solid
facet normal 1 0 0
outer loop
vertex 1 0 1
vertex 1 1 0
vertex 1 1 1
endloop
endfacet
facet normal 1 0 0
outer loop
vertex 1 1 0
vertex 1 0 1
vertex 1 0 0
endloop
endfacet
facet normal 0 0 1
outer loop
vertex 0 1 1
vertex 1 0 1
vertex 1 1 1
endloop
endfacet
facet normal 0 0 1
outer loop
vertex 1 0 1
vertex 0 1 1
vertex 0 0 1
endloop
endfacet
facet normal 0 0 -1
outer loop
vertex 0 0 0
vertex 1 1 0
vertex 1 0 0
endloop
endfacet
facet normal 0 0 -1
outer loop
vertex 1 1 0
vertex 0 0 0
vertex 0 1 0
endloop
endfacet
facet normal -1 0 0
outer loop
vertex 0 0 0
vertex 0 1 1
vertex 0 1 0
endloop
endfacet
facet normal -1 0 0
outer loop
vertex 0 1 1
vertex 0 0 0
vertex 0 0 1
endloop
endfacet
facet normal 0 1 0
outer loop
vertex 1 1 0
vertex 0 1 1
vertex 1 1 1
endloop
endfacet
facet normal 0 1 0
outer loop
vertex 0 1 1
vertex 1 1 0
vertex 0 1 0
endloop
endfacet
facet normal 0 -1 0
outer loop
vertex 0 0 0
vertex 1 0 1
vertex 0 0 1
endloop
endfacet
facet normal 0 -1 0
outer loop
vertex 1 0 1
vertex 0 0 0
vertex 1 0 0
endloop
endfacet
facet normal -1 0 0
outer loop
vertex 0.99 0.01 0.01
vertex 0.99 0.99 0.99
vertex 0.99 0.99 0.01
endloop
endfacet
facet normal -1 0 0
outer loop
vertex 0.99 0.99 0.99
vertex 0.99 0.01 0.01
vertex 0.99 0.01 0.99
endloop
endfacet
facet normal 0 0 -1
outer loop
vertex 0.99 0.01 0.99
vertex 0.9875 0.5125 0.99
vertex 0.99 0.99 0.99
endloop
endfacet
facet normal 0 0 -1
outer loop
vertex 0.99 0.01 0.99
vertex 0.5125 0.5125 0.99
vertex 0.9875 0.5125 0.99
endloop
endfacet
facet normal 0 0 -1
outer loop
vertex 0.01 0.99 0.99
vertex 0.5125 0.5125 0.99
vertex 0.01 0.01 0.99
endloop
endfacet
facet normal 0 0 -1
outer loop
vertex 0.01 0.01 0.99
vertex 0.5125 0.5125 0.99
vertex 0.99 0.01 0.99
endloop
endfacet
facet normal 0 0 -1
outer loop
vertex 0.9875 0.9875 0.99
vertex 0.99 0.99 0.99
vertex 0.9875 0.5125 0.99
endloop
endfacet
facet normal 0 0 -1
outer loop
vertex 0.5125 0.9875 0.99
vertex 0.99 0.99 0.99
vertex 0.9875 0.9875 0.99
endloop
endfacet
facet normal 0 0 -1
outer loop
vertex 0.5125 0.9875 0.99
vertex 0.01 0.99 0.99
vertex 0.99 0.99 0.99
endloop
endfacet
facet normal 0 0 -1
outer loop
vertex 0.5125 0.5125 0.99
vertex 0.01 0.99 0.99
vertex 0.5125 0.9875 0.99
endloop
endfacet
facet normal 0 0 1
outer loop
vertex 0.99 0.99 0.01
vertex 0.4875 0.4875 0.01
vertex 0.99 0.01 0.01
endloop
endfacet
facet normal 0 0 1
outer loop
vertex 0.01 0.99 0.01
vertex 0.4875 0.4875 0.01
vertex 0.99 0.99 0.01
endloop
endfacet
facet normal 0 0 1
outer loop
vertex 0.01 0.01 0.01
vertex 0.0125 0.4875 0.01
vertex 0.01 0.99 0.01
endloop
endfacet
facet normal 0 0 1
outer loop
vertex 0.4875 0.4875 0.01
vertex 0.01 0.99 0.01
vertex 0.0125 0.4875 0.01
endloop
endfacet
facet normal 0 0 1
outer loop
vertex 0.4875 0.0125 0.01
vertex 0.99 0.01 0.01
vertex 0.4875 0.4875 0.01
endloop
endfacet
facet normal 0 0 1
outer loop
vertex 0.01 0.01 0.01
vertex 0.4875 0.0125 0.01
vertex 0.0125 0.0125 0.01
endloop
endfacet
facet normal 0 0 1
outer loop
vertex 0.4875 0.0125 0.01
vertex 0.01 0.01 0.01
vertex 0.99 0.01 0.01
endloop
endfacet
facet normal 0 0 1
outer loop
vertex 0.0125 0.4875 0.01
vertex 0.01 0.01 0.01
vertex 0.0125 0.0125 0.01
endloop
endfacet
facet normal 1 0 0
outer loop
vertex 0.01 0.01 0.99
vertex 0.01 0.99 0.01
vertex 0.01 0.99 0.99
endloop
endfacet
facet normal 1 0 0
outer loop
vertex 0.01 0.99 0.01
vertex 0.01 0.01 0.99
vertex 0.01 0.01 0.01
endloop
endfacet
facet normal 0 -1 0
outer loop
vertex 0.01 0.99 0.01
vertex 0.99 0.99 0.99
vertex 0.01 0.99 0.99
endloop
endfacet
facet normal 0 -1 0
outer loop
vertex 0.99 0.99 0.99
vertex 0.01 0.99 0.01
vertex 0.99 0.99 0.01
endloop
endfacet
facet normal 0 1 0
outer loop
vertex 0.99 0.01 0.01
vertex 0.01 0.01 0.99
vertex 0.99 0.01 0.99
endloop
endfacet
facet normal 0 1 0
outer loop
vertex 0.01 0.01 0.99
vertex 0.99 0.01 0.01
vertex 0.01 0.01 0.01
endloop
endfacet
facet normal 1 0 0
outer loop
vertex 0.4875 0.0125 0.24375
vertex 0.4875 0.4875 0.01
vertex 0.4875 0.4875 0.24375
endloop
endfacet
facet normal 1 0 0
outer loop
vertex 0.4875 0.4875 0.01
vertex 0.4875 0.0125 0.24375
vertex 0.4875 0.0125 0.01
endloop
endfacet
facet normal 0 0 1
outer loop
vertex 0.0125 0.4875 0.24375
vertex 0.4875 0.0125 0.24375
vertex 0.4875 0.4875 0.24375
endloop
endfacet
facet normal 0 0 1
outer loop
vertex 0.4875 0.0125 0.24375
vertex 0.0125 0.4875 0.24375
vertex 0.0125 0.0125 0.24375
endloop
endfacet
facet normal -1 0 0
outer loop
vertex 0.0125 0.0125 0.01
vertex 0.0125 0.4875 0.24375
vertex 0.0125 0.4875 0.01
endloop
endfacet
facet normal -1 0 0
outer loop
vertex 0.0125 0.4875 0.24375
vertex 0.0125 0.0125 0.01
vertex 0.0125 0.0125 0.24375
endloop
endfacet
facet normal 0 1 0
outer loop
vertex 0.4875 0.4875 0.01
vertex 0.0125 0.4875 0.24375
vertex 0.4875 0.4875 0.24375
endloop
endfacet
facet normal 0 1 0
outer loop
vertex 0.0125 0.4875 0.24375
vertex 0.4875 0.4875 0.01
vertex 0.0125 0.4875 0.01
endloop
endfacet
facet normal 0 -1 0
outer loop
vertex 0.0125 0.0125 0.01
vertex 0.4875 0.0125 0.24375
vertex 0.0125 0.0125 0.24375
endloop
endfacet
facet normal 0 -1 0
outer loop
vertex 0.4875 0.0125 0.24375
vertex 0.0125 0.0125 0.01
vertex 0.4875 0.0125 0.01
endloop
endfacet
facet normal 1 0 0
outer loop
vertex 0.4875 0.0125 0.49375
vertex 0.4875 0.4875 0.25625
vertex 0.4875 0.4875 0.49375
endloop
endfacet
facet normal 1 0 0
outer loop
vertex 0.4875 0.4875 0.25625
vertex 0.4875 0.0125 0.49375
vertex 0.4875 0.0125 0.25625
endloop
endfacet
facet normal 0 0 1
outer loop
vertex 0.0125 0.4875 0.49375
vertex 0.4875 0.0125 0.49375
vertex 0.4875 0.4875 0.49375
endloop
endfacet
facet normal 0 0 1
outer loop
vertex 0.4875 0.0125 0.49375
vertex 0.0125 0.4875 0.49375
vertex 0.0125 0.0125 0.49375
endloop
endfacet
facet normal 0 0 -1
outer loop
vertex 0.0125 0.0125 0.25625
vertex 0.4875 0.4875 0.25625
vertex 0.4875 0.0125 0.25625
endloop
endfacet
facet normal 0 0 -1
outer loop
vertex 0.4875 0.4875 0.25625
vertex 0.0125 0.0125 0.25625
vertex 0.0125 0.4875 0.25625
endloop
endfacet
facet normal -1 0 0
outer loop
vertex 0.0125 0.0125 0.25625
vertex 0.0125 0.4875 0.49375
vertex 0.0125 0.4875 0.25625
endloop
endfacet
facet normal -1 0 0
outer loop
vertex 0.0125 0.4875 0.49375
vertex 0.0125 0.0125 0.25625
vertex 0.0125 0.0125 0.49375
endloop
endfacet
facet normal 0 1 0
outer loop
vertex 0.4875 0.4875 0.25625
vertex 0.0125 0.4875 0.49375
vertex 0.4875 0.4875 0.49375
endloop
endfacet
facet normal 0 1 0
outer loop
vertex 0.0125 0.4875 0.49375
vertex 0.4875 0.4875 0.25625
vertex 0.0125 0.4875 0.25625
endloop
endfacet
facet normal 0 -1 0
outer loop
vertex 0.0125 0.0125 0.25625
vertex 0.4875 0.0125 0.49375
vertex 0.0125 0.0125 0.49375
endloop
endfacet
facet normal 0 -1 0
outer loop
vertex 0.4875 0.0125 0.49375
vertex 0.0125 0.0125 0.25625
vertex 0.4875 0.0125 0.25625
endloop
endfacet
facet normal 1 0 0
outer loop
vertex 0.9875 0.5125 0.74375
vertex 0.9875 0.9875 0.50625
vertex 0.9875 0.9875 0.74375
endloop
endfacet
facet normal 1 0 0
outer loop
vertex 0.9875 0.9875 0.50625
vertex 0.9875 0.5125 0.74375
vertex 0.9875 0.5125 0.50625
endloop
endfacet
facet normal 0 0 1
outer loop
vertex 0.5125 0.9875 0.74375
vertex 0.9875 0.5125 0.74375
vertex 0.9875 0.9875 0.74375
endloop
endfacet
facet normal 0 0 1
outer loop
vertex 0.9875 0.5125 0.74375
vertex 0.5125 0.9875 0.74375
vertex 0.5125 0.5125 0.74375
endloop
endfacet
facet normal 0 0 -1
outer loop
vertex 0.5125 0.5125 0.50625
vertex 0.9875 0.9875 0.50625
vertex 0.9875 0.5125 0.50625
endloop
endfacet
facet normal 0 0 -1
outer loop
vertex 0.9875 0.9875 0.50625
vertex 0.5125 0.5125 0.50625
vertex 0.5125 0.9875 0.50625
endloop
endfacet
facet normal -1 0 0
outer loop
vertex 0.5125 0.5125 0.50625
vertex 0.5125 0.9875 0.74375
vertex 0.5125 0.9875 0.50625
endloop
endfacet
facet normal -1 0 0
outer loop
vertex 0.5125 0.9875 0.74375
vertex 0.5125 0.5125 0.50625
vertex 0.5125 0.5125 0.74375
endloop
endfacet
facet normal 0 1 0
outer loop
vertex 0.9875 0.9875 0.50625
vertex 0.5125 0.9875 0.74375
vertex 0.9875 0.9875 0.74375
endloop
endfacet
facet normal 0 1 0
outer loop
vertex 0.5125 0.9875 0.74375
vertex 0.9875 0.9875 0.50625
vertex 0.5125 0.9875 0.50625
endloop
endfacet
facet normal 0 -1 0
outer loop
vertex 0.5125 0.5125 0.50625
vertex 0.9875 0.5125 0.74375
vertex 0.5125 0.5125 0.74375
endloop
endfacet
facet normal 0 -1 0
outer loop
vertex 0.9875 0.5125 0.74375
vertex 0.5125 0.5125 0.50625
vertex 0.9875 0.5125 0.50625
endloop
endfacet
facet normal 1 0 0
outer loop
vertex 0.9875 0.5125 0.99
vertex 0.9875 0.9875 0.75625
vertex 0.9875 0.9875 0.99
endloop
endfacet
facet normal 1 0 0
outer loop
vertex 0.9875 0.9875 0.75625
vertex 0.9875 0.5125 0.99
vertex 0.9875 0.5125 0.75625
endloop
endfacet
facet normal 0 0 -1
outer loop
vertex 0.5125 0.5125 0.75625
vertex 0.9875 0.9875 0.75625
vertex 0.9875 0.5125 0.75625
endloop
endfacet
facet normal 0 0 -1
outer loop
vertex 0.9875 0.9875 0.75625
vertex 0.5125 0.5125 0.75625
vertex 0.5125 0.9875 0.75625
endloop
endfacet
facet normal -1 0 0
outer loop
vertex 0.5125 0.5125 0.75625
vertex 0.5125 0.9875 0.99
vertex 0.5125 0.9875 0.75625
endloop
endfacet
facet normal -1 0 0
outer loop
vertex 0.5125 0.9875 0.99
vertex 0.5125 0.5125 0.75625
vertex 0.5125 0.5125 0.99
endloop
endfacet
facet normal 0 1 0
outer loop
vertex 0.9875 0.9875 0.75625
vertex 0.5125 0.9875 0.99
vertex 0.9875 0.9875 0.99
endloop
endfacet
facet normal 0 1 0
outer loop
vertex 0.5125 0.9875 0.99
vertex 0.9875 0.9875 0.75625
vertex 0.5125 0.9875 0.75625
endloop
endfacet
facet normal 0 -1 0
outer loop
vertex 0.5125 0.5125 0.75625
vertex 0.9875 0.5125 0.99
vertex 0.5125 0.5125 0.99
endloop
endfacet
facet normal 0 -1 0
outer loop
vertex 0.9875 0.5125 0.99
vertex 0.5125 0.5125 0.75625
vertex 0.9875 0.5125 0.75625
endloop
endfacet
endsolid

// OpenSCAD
translate([0.25, 0.25, 0.125]) color([0.471983165944875, 0.9714323160653209, 0.04763662747320219]) cube([0.475, 0.475, 0.2375], center=true);
translate([0.25, 0.25, 0.375]) color([0.6017048999912084, 0.4238608699583831, 0.4638000243525888]) cube([0.475, 0.475, 0.2375], center=true);
translate([0.75, 0.75, 0.625]) color([0.7209222138626044, 0.34055156238440487, 0.1919764175902523]) cube([0.475, 0.475, 0.2375], center=true);
translate([0.75, 0.75, 0.875]) color([0.14158894806865308, 0.5899031024545329, 0.5257452959268315]) cube([0.475, 0.475, 0.2375], center=true);
color([0.3,0.3,0.3,0.3]) difference() { cube([1,1,1]); translate([0.01,0.01,0.01]) cube([0.98,0.98,0.98]); }
